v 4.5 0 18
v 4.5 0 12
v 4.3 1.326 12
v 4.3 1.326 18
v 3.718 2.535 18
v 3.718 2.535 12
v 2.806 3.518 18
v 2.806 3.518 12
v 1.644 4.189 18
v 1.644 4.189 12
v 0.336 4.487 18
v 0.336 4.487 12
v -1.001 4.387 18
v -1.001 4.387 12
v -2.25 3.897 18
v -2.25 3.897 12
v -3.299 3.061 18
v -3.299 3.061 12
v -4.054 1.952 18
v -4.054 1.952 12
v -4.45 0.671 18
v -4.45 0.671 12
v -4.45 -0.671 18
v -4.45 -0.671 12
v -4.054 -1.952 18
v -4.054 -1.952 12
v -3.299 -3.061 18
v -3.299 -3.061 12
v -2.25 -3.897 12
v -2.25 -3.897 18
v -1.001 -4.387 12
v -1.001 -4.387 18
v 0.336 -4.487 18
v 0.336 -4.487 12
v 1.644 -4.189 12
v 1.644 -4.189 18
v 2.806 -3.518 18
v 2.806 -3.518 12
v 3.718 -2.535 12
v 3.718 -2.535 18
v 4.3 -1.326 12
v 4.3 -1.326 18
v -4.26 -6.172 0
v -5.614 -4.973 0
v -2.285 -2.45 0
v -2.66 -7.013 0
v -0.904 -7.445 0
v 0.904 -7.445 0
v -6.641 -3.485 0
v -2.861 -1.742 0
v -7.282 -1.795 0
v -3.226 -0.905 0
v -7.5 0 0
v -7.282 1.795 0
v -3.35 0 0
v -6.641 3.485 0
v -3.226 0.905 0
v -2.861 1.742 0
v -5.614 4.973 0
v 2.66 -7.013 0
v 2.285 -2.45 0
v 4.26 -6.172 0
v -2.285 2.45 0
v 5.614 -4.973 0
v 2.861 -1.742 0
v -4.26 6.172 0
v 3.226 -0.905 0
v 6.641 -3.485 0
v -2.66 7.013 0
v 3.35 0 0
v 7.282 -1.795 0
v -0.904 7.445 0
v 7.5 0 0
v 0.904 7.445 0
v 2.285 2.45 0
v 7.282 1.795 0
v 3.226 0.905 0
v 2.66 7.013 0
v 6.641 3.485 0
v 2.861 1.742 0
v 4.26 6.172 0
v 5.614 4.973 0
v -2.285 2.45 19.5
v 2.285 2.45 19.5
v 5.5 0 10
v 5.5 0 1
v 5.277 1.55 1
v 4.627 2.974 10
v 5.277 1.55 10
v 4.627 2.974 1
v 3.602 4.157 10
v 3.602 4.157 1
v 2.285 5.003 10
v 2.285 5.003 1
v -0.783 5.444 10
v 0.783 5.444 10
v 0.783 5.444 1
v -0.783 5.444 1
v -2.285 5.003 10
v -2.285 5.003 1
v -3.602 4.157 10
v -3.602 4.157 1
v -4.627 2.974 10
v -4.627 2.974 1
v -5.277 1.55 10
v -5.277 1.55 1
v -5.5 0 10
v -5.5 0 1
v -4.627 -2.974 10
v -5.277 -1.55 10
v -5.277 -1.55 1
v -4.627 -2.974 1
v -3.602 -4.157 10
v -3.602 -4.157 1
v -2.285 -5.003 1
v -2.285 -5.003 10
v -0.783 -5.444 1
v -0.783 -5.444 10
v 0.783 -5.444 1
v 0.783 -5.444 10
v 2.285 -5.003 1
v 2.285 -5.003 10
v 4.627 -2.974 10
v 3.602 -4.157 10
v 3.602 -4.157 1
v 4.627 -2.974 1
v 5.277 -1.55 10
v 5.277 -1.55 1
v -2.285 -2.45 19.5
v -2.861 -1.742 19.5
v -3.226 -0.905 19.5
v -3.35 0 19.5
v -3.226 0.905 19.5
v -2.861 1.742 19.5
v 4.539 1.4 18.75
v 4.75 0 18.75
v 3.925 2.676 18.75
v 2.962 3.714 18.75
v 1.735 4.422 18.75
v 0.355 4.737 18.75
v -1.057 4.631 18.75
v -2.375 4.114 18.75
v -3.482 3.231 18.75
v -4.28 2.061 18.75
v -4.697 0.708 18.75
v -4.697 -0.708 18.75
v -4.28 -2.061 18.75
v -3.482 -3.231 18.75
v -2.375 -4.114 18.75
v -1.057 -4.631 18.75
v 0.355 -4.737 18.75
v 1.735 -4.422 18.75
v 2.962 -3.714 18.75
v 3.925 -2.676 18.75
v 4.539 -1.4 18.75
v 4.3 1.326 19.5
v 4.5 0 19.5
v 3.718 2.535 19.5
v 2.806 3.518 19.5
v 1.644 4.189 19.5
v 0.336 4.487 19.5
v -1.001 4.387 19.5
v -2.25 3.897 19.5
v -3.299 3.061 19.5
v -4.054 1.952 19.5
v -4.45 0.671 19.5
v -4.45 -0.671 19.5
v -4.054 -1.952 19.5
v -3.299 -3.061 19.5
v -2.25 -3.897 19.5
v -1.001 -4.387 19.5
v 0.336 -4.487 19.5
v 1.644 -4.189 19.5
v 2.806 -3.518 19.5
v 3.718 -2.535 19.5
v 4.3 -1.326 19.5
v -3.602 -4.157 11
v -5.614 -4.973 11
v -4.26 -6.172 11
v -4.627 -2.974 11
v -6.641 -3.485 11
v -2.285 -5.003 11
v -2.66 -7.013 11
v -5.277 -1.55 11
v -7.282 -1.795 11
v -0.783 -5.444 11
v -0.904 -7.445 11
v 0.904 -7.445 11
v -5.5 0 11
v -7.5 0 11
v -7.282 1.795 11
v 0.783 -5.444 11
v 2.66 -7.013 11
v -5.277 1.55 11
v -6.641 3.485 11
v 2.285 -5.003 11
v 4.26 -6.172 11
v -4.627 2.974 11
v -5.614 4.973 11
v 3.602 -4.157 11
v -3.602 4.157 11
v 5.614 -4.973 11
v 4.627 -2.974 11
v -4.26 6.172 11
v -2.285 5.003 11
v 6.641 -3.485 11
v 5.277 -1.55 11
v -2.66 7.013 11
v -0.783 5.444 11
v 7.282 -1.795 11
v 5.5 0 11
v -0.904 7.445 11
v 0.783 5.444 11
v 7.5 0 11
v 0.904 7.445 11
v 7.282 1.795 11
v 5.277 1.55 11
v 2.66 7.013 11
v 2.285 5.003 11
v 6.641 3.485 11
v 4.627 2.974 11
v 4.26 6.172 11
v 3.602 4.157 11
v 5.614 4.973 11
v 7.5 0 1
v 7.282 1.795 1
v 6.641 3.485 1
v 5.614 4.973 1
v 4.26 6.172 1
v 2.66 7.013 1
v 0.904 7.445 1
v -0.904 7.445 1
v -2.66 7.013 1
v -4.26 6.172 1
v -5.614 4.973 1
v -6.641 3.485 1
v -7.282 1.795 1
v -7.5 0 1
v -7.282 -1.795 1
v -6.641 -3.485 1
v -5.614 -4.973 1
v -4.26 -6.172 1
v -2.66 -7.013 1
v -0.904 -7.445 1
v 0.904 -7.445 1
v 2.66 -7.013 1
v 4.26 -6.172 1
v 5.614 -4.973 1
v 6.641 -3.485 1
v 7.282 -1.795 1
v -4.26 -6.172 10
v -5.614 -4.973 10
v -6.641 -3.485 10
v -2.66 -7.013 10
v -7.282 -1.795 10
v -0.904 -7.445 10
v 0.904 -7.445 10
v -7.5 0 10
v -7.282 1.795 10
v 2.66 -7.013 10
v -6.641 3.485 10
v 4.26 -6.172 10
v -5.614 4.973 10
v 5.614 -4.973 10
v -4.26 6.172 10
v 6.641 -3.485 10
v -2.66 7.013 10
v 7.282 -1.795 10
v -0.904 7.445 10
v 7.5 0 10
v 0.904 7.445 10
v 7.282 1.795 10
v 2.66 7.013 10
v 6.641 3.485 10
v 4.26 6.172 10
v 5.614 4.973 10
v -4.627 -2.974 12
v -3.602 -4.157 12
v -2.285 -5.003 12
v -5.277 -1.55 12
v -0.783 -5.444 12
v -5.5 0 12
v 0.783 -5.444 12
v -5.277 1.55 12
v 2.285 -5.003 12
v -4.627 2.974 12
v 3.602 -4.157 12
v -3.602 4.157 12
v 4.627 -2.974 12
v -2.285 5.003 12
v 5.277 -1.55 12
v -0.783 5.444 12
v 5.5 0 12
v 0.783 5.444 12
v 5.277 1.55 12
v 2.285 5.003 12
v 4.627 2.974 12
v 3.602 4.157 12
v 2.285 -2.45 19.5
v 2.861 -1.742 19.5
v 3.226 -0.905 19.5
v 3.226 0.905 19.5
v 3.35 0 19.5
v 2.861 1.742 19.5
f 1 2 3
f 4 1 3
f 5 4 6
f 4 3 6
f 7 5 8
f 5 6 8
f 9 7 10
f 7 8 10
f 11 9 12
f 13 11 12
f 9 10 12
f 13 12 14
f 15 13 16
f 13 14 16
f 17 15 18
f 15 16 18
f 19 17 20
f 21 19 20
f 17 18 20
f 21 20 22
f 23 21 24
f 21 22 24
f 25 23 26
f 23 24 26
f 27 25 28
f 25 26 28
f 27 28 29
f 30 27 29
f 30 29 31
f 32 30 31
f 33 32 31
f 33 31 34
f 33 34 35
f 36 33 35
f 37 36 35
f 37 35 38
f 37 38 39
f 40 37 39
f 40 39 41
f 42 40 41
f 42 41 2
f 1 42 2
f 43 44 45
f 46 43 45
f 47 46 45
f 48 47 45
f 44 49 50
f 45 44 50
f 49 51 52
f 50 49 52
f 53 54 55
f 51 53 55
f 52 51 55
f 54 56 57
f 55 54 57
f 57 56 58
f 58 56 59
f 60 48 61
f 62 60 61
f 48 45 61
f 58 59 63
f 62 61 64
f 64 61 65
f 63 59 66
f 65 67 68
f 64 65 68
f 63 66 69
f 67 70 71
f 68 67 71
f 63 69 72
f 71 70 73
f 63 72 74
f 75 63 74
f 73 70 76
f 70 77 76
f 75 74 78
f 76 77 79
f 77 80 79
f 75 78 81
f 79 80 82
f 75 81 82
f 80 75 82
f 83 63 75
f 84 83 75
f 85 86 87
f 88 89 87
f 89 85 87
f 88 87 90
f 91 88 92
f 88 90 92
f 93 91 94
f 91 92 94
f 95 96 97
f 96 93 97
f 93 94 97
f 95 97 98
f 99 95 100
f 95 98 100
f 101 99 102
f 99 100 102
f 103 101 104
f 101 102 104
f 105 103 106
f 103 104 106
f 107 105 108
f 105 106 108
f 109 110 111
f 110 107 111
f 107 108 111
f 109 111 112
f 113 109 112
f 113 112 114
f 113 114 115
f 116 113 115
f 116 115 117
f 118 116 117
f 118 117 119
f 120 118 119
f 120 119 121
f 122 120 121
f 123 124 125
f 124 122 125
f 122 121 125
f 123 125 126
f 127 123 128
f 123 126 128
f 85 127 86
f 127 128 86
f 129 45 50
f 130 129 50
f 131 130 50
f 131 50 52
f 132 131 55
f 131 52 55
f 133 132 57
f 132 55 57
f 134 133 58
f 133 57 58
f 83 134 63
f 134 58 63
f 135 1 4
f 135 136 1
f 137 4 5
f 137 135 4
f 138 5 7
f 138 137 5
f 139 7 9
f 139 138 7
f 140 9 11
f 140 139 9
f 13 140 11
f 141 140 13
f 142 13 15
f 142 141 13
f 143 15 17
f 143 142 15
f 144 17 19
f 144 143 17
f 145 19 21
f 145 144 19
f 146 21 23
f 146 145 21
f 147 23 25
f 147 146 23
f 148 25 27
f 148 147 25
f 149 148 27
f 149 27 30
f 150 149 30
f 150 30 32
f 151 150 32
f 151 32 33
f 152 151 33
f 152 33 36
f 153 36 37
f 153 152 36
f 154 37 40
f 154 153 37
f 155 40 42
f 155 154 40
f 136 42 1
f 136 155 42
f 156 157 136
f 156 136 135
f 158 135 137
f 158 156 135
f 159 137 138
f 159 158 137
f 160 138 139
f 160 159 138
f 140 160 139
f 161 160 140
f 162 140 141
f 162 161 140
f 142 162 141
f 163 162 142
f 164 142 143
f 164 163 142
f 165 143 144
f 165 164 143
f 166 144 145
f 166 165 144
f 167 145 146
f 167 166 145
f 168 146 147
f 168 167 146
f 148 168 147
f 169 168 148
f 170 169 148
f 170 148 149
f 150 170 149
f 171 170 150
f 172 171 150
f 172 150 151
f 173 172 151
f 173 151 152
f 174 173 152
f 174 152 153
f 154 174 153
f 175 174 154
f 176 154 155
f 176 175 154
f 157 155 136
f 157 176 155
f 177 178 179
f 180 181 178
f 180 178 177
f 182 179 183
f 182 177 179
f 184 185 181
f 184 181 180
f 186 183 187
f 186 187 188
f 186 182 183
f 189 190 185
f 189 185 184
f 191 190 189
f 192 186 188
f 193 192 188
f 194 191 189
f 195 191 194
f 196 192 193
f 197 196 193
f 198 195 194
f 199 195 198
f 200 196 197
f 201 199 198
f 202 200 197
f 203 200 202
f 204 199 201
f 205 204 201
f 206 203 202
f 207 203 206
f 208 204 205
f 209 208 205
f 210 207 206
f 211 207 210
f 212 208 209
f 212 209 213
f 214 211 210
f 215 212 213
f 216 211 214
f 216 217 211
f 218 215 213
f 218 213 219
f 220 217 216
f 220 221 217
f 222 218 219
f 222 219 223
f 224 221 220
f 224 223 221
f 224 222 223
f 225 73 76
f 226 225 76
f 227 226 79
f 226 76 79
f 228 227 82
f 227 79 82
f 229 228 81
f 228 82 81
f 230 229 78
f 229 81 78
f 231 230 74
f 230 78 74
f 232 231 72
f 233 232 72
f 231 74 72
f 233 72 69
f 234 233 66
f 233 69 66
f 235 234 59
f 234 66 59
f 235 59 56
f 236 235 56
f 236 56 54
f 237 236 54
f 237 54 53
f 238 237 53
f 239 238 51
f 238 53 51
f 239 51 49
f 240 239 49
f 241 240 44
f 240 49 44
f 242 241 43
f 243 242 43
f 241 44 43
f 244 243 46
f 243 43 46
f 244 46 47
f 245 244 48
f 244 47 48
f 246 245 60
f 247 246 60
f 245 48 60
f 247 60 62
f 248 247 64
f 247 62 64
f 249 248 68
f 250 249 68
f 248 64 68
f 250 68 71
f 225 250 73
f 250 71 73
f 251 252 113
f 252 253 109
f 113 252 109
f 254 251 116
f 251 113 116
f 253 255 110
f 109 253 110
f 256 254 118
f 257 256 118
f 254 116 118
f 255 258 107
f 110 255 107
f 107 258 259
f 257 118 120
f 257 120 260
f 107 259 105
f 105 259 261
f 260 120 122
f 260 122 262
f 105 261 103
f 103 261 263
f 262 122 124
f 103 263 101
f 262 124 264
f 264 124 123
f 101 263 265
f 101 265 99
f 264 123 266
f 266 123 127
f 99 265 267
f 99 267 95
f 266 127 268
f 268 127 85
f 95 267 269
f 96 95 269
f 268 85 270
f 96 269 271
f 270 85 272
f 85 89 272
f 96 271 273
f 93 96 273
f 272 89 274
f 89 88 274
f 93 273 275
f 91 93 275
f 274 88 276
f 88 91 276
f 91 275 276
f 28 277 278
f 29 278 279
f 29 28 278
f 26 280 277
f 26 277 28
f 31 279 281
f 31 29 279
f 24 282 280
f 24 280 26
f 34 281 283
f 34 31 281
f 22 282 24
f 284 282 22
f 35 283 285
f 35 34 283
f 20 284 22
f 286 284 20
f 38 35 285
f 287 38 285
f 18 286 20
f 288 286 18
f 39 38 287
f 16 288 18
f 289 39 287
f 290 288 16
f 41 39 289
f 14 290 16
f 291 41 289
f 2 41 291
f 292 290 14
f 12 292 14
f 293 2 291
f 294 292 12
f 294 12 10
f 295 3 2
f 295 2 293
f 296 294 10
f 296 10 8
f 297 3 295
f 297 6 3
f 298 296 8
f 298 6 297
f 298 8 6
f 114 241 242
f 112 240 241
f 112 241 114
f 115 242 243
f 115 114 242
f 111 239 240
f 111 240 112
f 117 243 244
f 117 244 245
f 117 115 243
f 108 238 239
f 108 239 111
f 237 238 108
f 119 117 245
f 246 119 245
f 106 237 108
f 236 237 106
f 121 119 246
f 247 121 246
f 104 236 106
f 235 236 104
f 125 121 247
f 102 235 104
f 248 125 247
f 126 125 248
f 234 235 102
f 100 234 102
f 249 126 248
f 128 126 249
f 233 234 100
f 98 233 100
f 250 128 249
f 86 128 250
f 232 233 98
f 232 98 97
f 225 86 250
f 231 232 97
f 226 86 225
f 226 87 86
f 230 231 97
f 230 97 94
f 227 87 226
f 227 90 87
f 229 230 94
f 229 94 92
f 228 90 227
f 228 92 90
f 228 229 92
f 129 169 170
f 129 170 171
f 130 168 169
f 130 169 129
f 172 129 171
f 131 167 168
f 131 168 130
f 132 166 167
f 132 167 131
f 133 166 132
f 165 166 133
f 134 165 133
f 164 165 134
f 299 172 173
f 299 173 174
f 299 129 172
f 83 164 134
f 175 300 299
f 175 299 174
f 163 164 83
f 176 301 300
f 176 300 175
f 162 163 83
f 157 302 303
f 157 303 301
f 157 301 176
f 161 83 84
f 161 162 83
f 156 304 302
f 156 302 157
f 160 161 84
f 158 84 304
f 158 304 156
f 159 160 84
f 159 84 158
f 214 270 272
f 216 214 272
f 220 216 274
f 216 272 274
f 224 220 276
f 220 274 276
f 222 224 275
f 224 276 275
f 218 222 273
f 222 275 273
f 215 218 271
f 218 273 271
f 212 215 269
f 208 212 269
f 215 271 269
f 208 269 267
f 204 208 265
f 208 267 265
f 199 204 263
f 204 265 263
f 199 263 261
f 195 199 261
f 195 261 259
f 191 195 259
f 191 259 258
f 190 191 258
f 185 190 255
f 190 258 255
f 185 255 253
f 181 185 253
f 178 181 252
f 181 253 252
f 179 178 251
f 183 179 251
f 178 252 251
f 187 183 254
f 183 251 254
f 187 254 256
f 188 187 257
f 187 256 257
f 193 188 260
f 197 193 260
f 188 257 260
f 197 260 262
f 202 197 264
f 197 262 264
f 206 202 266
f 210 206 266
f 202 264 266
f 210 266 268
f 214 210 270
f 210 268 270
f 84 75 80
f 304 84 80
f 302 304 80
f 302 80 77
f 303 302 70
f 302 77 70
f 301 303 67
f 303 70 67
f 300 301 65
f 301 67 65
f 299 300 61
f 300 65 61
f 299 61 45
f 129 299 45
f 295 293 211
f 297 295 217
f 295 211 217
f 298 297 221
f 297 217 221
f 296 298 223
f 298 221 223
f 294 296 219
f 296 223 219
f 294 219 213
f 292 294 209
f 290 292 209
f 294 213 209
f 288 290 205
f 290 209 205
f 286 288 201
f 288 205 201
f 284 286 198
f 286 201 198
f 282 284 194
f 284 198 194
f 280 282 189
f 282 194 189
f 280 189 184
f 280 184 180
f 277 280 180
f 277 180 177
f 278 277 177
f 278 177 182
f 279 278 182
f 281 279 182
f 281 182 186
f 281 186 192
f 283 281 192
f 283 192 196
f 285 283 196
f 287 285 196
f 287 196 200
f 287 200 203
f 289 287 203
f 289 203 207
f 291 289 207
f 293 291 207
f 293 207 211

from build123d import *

# Parameters (mm, degrees)
F0_R     = 7.5
F0_R_2   = 5.5
F0_R_3   = 4.5
F1_DEPTH = 1
F3_DEPTH = 12
F4_DEPTH = 19.5


with BuildPart() as f1:
    # F0 (on Top) → F1 (new body)
    with BuildSketch(Plane.XY):
        Circle(F0_R)
        Circle(F0_R_2, mode=Mode.SUBTRACT)
        Circle(F0_R_2)
        Circle(F0_R_3, mode=Mode.SUBTRACT)
        Circle(F0_R_3)
        with BuildLine():
            ThreePointArc((-2.284732, -2.45), (-3.35, 0), (-2.284732, 2.45))
            Line((-2.284732, 2.45), (2.284732, 2.45))
            ThreePointArc((2.284732, 2.45), (3.35, 0), (2.284732, -2.45))
            Line((2.284732, -2.45), (-2.284732, -2.45))
        make_face(mode=Mode.SUBTRACT)
    extrude(amount=F1_DEPTH)



with BuildPart() as f2_1:
    # F2: copy of F1
    add(f1.part.moved(Location((0, 0, 10))))


with BuildPart() as f3:
    # F0 (on Top) → F3 (new body)
    with BuildSketch(Plane.XY):
        Circle(F0_R_2)
        Circle(F0_R_3, mode=Mode.SUBTRACT)
        Circle(F0_R_3)
        with BuildLine():
            ThreePointArc((-2.284732, -2.45), (-3.35, 0), (-2.284732, 2.45))
            Line((-2.284732, 2.45), (2.284732, 2.45))
            ThreePointArc((2.284732, 2.45), (3.35, 0), (2.284732, -2.45))
            Line((2.284732, -2.45), (-2.284732, -2.45))
        make_face(mode=Mode.SUBTRACT)
    extrude(amount=F3_DEPTH)


with BuildPart() as f1_1:
    add(f1.part)

    add(f2_1.part)  # F4 merges F2_1

    add(f3.part)  # F4 merges F3
    # F0 (on Top) → F4 (join)
    with BuildSketch(Plane.XY):
        Circle(F0_R_3)
        with BuildLine():
            ThreePointArc((-2.284732, -2.45), (-3.35, 0), (-2.284732, 2.45))
            Line((-2.284732, 2.45), (2.284732, 2.45))
            ThreePointArc((2.284732, 2.45), (3.35, 0), (2.284732, -2.45))
            Line((2.284732, -2.45), (-2.284732, -2.45))
        make_face(mode=Mode.SUBTRACT)
    extrude(amount=F4_DEPTH)

    # F5 (on Front) → F6 (revolve)
    with BuildSketch(Plane.XZ):
        Polygon((4.75, 18.75), (4.5, 19.5), (4.5, 18), align=None)
    revolve(axis=Axis((0, 0, 8.754228), (0, 0, 1)))


solid = f1_1.part
